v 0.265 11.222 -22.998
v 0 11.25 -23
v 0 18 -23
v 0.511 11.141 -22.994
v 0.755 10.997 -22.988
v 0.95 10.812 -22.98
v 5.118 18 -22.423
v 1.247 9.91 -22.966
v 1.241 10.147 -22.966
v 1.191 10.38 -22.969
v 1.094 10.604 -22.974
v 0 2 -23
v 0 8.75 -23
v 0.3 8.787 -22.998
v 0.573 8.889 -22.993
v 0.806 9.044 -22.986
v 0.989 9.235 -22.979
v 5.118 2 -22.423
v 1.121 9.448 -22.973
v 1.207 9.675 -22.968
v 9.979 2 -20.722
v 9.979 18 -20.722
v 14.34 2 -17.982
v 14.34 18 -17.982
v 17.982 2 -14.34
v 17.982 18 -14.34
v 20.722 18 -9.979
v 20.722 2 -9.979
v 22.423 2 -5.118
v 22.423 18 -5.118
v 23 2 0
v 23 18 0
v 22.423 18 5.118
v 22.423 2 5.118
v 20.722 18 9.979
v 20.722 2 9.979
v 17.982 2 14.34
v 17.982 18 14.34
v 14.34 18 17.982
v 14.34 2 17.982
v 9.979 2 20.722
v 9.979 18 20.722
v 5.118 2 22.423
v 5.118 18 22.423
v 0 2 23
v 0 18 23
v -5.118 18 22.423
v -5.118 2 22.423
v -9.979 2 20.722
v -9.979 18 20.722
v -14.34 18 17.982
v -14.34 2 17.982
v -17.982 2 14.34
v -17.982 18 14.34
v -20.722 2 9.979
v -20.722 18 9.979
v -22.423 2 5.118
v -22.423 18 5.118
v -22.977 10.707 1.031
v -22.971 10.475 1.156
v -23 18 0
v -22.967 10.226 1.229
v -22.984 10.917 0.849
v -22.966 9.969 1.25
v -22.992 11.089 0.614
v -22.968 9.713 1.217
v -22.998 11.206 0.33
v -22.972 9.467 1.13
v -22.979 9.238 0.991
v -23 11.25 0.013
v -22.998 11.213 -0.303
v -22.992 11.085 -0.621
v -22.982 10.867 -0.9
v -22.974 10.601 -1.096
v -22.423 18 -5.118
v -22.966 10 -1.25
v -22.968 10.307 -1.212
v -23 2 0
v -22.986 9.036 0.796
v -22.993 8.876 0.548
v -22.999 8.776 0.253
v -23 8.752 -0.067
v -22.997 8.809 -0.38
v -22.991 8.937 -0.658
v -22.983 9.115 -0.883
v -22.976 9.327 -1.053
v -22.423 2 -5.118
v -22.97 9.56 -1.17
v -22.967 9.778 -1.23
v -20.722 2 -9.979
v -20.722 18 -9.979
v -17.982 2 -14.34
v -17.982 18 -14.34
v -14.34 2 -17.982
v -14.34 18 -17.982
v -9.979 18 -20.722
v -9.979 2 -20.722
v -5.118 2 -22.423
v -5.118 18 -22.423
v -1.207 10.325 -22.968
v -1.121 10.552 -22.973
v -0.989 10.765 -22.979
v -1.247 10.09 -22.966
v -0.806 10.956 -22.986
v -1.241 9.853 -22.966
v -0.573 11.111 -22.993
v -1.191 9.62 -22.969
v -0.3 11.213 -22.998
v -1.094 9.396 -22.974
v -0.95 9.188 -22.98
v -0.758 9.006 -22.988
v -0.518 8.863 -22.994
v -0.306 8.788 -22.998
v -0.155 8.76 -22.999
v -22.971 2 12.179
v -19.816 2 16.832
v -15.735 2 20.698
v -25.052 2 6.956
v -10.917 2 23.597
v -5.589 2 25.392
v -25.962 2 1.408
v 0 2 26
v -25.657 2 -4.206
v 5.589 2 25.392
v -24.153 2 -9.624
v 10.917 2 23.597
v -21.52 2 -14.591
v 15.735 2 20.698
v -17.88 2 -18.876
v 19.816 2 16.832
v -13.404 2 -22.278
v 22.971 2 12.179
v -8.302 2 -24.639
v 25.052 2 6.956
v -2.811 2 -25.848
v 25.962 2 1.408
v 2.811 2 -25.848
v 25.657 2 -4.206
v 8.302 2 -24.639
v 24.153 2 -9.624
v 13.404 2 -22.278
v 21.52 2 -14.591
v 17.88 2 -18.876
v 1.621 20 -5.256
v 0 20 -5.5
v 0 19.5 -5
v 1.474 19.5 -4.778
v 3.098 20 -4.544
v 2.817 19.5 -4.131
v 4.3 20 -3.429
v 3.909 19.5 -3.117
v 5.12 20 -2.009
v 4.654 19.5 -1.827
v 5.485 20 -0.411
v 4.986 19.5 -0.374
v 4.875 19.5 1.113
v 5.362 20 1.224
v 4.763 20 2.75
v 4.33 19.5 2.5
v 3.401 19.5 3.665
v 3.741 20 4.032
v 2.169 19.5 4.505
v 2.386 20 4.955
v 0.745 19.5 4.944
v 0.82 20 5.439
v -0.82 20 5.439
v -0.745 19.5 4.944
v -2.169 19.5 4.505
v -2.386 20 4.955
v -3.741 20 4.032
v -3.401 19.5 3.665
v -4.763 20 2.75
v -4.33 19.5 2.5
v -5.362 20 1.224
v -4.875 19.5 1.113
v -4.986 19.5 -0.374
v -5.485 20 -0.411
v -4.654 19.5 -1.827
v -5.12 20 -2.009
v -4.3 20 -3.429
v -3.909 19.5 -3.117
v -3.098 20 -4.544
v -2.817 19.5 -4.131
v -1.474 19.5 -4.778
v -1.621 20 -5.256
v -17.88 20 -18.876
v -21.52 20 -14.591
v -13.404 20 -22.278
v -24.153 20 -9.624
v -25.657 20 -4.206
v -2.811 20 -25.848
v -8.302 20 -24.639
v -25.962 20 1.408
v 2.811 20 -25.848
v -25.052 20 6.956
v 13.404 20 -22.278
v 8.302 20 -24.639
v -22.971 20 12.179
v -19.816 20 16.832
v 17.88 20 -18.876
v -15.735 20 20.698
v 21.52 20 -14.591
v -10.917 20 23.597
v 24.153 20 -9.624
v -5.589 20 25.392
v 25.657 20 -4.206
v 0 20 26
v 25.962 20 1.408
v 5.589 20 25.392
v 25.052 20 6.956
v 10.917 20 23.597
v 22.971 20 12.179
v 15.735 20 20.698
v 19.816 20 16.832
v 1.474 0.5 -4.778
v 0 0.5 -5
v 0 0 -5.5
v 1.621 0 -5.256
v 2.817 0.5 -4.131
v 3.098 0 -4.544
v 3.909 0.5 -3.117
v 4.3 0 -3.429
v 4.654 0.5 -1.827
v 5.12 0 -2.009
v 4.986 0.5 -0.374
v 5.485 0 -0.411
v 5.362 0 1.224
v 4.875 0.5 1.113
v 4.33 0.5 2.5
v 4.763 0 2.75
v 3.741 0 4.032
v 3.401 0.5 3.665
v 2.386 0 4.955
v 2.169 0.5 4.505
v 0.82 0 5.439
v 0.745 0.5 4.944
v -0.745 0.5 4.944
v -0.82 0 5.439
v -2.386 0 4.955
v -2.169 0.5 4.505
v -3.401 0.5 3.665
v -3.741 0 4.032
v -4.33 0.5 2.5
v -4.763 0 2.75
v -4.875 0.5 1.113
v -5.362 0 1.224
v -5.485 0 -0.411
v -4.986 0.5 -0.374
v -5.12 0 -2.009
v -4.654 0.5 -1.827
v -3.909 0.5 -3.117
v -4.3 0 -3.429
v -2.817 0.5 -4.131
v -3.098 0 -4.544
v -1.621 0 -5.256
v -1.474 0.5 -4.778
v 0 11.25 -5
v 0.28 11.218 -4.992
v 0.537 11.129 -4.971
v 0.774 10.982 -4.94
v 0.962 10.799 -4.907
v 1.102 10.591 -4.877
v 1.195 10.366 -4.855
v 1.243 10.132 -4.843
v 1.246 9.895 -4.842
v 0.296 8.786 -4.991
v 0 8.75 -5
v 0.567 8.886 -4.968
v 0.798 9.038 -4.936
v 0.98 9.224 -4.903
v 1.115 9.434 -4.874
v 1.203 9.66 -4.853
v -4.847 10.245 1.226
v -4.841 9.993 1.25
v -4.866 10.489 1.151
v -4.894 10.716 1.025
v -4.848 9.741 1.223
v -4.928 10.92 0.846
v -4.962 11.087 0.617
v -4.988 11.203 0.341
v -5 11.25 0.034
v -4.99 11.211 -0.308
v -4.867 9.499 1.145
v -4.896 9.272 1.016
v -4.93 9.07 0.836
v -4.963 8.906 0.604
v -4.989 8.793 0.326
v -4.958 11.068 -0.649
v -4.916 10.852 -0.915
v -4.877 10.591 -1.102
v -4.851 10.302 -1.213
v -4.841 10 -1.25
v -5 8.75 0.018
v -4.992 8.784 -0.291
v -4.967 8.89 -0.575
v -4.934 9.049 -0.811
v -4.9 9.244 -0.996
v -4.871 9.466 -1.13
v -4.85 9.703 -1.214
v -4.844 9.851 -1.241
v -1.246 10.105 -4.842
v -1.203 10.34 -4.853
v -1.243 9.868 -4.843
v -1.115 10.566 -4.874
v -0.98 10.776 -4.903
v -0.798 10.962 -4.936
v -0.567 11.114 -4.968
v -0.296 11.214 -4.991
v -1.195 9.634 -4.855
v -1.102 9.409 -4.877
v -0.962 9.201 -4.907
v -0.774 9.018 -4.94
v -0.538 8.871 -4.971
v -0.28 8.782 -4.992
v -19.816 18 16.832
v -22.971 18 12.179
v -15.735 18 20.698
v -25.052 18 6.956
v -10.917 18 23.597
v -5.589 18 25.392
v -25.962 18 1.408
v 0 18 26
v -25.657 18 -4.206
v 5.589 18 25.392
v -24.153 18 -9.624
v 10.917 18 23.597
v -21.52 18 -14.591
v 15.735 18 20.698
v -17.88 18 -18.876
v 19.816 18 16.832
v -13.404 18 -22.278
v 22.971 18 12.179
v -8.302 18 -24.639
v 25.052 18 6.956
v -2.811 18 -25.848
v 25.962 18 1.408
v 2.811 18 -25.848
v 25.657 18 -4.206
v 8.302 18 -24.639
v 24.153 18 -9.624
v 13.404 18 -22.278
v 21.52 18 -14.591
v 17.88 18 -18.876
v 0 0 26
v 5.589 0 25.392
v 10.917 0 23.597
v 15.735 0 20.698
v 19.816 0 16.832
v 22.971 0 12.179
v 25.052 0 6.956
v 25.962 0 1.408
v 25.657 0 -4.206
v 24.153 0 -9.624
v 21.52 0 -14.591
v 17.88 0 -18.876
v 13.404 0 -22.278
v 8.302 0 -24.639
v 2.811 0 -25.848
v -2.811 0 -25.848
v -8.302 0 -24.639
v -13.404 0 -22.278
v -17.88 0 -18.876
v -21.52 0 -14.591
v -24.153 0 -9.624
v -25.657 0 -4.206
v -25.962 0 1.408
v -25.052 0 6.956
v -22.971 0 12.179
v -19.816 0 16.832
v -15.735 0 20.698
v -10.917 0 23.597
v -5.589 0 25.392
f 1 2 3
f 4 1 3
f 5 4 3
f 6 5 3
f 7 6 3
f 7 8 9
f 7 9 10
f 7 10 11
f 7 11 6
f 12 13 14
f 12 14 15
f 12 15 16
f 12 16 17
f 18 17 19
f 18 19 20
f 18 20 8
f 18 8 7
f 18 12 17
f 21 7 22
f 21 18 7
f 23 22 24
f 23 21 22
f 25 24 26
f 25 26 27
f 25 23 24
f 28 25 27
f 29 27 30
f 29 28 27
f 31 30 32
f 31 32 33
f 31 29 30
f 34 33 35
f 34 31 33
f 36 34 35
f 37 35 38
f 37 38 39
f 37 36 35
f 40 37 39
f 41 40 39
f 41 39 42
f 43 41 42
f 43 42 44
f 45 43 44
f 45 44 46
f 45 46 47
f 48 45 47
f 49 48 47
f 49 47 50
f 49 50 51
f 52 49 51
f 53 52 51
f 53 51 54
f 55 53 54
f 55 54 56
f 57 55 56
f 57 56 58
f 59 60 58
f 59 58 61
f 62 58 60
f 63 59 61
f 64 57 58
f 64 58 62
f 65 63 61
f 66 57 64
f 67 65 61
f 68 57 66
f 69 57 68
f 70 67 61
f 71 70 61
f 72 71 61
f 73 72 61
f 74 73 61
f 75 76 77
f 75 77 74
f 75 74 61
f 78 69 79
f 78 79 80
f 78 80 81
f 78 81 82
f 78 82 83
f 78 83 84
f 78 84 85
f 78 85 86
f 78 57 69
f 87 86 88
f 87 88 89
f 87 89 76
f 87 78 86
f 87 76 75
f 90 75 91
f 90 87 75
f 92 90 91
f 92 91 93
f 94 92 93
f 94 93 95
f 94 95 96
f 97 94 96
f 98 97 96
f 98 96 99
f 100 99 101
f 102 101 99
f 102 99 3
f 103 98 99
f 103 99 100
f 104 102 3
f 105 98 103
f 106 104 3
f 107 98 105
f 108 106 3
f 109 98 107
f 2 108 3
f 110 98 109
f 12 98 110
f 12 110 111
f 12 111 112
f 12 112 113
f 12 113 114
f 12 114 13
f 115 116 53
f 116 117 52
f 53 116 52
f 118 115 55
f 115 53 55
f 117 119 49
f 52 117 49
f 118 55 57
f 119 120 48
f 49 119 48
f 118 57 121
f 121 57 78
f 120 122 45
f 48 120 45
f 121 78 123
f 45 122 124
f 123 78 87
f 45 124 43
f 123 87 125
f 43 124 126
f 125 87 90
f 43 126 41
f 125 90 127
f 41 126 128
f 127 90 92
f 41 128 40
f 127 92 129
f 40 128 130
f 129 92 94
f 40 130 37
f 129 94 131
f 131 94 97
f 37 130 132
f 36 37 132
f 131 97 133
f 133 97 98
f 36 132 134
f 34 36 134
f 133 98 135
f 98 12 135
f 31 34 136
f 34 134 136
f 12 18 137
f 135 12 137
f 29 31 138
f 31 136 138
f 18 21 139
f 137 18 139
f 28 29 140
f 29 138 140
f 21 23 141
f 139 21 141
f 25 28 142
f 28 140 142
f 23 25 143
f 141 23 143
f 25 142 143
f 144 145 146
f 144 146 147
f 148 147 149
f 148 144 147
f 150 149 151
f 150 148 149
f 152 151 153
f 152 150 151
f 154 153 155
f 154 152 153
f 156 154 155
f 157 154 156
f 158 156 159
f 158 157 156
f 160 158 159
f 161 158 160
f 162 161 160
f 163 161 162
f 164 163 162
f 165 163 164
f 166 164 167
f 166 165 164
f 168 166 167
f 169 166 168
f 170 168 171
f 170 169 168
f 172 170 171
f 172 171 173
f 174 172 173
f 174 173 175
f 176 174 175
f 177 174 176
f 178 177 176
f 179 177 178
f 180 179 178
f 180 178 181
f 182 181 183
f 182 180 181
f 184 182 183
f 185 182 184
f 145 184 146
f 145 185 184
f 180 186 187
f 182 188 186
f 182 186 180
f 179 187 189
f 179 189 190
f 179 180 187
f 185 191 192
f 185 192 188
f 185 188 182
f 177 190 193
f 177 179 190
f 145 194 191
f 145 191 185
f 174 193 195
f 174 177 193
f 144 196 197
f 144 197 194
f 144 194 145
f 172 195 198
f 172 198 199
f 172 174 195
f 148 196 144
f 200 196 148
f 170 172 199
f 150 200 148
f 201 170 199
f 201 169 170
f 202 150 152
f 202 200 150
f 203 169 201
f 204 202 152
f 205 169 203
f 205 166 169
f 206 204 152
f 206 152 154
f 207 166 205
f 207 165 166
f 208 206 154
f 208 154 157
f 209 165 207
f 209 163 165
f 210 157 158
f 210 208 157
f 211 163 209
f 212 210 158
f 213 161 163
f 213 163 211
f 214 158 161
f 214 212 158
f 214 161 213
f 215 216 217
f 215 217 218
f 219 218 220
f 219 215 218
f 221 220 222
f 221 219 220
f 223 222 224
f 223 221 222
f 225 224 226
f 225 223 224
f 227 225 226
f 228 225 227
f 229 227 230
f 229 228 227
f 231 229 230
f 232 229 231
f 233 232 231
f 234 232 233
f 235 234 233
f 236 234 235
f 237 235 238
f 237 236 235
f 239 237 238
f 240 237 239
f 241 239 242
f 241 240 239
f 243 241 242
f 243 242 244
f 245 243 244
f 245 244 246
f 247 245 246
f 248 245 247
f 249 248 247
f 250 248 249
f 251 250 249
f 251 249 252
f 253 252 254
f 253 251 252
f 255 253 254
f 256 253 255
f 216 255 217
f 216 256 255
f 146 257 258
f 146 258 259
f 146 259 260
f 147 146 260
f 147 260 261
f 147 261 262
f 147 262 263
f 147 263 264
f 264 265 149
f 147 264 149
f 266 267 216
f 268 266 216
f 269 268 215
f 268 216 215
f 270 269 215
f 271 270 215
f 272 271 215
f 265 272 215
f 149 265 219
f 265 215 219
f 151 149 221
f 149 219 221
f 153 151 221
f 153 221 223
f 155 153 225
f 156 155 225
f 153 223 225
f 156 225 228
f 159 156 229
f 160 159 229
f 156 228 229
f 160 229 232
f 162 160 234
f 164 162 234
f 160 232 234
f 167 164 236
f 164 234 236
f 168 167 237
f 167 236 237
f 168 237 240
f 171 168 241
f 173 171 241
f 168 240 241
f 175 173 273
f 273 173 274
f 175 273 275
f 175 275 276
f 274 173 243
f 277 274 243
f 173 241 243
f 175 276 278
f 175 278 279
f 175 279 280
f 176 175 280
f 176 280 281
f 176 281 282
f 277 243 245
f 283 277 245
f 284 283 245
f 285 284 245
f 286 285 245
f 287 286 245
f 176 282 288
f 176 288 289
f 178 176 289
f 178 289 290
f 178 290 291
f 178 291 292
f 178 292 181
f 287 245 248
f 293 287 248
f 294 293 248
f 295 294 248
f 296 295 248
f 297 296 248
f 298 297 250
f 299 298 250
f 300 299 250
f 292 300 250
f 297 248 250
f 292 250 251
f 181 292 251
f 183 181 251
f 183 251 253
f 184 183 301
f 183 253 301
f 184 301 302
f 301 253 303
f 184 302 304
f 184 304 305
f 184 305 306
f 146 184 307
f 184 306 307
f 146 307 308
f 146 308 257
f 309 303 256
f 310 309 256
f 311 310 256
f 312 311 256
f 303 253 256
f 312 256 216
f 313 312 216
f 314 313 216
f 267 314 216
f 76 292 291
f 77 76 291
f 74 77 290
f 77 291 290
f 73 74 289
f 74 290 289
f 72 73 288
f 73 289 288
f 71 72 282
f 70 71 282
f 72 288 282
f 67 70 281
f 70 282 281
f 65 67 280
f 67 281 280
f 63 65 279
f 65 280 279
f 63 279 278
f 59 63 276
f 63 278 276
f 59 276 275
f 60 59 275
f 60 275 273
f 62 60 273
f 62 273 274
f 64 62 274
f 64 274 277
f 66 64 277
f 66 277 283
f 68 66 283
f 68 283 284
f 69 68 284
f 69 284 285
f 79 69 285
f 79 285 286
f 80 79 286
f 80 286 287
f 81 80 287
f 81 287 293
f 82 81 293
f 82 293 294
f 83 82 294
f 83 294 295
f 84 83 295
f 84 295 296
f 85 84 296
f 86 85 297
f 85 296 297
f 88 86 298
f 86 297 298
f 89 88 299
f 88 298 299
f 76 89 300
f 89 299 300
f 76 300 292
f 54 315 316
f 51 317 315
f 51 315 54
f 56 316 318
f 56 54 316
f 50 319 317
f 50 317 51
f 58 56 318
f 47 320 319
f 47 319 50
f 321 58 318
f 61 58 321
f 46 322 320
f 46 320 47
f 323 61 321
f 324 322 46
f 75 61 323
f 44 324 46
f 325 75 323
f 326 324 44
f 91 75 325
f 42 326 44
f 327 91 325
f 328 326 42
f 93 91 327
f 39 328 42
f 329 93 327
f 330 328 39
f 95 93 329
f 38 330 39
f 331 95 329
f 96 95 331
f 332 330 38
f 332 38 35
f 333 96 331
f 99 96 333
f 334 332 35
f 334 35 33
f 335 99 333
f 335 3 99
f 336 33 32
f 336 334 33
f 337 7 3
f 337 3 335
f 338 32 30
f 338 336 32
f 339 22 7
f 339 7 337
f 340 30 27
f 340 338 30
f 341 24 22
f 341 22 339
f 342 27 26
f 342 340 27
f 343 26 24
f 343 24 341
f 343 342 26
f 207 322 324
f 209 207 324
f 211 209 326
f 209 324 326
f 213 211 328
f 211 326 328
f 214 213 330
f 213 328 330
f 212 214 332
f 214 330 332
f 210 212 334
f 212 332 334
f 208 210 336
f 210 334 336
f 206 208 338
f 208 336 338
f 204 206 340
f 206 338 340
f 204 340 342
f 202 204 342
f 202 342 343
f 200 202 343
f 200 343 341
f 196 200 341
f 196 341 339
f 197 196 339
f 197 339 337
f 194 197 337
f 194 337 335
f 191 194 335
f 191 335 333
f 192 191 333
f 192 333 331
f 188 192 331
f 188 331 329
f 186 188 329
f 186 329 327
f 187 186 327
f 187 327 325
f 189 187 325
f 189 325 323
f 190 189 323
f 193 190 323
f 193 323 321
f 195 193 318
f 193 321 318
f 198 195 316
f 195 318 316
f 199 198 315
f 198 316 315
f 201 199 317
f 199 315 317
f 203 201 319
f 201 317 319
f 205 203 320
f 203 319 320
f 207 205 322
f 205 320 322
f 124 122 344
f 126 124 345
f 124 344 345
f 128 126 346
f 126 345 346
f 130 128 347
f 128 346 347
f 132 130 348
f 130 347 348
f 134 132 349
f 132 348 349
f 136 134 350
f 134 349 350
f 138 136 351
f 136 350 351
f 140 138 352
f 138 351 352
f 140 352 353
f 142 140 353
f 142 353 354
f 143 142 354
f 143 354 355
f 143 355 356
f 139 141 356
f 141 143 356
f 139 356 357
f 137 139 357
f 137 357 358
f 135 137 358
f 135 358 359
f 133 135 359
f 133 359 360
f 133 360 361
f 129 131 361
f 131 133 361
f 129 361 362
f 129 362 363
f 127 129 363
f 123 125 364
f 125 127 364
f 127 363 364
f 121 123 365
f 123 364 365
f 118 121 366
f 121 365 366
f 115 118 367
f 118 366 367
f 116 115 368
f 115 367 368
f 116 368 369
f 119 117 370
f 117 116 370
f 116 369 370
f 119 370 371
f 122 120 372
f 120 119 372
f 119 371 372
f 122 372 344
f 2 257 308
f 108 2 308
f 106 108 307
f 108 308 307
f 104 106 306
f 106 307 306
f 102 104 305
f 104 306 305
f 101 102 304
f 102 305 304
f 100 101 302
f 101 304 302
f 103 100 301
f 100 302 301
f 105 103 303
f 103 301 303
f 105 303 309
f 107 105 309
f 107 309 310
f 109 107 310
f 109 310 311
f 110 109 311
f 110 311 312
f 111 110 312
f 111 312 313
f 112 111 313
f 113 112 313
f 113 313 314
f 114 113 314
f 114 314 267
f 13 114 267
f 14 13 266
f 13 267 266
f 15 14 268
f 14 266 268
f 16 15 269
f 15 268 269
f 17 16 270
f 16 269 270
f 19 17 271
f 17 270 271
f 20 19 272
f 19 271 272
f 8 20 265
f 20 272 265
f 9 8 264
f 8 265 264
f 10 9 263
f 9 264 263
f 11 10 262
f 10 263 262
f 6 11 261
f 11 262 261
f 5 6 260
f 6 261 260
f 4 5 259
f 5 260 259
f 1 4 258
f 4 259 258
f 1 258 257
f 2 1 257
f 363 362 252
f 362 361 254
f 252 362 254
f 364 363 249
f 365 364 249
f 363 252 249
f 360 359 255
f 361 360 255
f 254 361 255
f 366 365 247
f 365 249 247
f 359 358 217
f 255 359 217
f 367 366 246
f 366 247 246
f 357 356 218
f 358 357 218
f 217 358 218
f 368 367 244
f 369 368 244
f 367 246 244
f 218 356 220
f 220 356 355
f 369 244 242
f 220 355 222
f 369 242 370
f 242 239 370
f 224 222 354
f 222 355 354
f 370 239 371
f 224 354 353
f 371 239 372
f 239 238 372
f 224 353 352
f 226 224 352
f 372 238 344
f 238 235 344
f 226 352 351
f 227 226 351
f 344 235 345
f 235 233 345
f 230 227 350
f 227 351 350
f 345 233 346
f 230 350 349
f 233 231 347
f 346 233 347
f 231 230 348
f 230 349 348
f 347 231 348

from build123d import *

# Parameters (mm, degrees)
SKETCH_1_R          = 26
EXTRUDE_1_DEPTH     = 20
CUT_EXTRUDE_START   = -2
SKETCH_2_R          = 26
SKETCH_2_R_2        = 23
CUT_EXTRUDE_1_DEPTH = 16
SKETCH_3_R          = 5
CUT_EXTRUDE_2_DEPTH = 42.856899073
CHAMFER_1_SIZE      = 0.5
SKETCH_4_R          = 1.25
CUT_EXTRUDE_3_DEPTH = 42.856899073
SKETCH_5_R          = 1.25
CUT_EXTRUDE_4_DEPTH = 42.856899073


with BuildPart() as part:
    # 草图1 → 凸台-拉伸1 (new body)
    with BuildSketch(Plane(origin=(0, 0, 0), x_dir=(1, 0, 0), z_dir=(0, 1, 0))):
        with Locations(Location((0, 0, 0), (0, 0, 270))):
            Circle(SKETCH_1_R)
    extrude(amount=EXTRUDE_1_DEPTH)

    # 草图2 → 切除-拉伸1 (cut)
    with BuildSketch(Plane.XZ.offset(CUT_EXTRUDE_START)):
        with Locations(Location((0, 0, 0), (0, 0, 270))):
            Circle(SKETCH_2_R)
        with Locations(Location((0, 0, 0), (0, 0, 270))):
            Circle(SKETCH_2_R_2, mode=Mode.SUBTRACT)
    extrude(amount=-CUT_EXTRUDE_1_DEPTH, mode=Mode.SUBTRACT)

    # 草图3 → 切除-拉伸2 (cut, through all)
    with BuildSketch(Plane.XZ):
        with Locations(Location((0, 0, 0), (0, 0, 270))):
            Circle(SKETCH_3_R)
    extrude(amount=-CUT_EXTRUDE_2_DEPTH, mode=Mode.SUBTRACT)

    # 倒角1
    chamfer_1_edges = [part.edges().sort_by_distance(p)[0] for p in [
        (0, 20, 5),
        (0, 0, 5),
    ]]
    chamfer(chamfer_1_edges, length=CHAMFER_1_SIZE)

    # 草图4 → 切除-拉伸3 (cut, through all)
    with BuildSketch(Plane.XY):
        with Locations(Location((0, 10, 0), (0, 0, 90))):
            Circle(SKETCH_4_R)
    extrude(amount=-CUT_EXTRUDE_3_DEPTH, mode=Mode.SUBTRACT)

    # 草图5 → 切除-拉伸4 (cut, through all)
    with BuildSketch(Plane(origin=(0, 0, 0), x_dir=(0, 0, -1), z_dir=(1, 0, 0))):
        with Locations((0, 10)):
            Circle(SKETCH_5_R)
    extrude(amount=-CUT_EXTRUDE_4_DEPTH, mode=Mode.SUBTRACT)


solid = part.part
